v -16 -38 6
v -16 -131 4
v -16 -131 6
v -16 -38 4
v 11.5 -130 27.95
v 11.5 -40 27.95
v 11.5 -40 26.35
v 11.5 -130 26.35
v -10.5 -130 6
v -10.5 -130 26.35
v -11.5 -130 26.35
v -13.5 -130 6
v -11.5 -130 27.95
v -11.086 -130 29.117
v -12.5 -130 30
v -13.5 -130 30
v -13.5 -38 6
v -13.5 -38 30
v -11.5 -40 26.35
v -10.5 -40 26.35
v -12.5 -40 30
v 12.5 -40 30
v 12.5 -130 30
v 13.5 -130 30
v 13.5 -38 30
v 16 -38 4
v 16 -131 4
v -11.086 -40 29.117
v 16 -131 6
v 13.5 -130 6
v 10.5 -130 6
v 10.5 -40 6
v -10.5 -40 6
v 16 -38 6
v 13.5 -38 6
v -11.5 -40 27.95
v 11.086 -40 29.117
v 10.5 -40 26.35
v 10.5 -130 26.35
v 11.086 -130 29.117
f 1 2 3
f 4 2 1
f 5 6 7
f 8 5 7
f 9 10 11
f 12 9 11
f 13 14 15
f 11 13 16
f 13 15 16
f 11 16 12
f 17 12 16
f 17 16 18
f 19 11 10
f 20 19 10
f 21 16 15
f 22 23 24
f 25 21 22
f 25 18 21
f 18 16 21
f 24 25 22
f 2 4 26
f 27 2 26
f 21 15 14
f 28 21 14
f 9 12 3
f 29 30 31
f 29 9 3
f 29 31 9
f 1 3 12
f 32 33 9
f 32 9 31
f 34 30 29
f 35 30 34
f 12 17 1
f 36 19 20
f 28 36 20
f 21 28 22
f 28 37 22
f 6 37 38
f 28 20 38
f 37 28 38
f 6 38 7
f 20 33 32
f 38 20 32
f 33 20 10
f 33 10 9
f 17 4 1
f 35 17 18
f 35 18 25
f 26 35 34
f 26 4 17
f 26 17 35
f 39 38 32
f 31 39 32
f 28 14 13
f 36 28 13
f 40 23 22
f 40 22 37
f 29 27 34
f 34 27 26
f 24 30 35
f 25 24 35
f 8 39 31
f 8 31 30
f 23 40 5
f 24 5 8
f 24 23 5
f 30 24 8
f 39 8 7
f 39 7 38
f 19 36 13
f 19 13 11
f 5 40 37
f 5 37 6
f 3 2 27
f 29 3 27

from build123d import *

# Parameters (mm, degrees)
SKETCH010_W  = 32
SKETCH010_H  = 93
PAD008_DEPTH = 2
PAD009_DEPTH = 90
SKETCH012_W  = 27
SKETCH012_H  = 2
PAD010_DEPTH = 3
PAD011_DEPTH = 24


with BuildPart() as part:
    # Sketch010 → Pad008 (new body)
    with BuildSketch(Plane.XY):
        with Locations((0, -84.5)):
            Rectangle(SKETCH010_W, SKETCH010_H)
    extrude(amount=PAD008_DEPTH)

    # Sketch011 → Pad009 (join)
    with BuildSketch(Plane.XZ.offset(40)):
        Polygon((-13.5, 2), (-13.5, 26), (-12.5, 26), (-11.085595, 25.117329), (-11.5, 23.95), (-11.5, 22.35), (-10.5, 22.35), (-10.5, 2), align=None)
    pad009 = extrude(amount=PAD009_DEPTH)

    # Mirrored: Pad009 across Sketch011 V_Axis
    add(pad009.mirror(Plane(origin=(0, -40, 0), x_dir=(0, -1, 0), z_dir=(1, 0, 0))))

    # Sketch012 (on Face5 of Mirrored) → Pad010 (join)
    with BuildSketch(Plane.XY.offset(2)):
        with Locations((0, -39)):
            Rectangle(SKETCH012_W, SKETCH012_H)
    extrude(amount=PAD010_DEPTH)

    # Sketch012 (on Face5 of Mirrored) → Pad011 (join)
    with BuildSketch(Plane.XY.offset(2)):
        with Locations((0, -39)):
            Rectangle(SKETCH012_W, SKETCH012_H)
    extrude(amount=PAD011_DEPTH)


with BuildPart() as part_1:
    # Body006 placement: moved
    add(part.part.moved(Location((0, 0, 4))))


solid = part_1.part
